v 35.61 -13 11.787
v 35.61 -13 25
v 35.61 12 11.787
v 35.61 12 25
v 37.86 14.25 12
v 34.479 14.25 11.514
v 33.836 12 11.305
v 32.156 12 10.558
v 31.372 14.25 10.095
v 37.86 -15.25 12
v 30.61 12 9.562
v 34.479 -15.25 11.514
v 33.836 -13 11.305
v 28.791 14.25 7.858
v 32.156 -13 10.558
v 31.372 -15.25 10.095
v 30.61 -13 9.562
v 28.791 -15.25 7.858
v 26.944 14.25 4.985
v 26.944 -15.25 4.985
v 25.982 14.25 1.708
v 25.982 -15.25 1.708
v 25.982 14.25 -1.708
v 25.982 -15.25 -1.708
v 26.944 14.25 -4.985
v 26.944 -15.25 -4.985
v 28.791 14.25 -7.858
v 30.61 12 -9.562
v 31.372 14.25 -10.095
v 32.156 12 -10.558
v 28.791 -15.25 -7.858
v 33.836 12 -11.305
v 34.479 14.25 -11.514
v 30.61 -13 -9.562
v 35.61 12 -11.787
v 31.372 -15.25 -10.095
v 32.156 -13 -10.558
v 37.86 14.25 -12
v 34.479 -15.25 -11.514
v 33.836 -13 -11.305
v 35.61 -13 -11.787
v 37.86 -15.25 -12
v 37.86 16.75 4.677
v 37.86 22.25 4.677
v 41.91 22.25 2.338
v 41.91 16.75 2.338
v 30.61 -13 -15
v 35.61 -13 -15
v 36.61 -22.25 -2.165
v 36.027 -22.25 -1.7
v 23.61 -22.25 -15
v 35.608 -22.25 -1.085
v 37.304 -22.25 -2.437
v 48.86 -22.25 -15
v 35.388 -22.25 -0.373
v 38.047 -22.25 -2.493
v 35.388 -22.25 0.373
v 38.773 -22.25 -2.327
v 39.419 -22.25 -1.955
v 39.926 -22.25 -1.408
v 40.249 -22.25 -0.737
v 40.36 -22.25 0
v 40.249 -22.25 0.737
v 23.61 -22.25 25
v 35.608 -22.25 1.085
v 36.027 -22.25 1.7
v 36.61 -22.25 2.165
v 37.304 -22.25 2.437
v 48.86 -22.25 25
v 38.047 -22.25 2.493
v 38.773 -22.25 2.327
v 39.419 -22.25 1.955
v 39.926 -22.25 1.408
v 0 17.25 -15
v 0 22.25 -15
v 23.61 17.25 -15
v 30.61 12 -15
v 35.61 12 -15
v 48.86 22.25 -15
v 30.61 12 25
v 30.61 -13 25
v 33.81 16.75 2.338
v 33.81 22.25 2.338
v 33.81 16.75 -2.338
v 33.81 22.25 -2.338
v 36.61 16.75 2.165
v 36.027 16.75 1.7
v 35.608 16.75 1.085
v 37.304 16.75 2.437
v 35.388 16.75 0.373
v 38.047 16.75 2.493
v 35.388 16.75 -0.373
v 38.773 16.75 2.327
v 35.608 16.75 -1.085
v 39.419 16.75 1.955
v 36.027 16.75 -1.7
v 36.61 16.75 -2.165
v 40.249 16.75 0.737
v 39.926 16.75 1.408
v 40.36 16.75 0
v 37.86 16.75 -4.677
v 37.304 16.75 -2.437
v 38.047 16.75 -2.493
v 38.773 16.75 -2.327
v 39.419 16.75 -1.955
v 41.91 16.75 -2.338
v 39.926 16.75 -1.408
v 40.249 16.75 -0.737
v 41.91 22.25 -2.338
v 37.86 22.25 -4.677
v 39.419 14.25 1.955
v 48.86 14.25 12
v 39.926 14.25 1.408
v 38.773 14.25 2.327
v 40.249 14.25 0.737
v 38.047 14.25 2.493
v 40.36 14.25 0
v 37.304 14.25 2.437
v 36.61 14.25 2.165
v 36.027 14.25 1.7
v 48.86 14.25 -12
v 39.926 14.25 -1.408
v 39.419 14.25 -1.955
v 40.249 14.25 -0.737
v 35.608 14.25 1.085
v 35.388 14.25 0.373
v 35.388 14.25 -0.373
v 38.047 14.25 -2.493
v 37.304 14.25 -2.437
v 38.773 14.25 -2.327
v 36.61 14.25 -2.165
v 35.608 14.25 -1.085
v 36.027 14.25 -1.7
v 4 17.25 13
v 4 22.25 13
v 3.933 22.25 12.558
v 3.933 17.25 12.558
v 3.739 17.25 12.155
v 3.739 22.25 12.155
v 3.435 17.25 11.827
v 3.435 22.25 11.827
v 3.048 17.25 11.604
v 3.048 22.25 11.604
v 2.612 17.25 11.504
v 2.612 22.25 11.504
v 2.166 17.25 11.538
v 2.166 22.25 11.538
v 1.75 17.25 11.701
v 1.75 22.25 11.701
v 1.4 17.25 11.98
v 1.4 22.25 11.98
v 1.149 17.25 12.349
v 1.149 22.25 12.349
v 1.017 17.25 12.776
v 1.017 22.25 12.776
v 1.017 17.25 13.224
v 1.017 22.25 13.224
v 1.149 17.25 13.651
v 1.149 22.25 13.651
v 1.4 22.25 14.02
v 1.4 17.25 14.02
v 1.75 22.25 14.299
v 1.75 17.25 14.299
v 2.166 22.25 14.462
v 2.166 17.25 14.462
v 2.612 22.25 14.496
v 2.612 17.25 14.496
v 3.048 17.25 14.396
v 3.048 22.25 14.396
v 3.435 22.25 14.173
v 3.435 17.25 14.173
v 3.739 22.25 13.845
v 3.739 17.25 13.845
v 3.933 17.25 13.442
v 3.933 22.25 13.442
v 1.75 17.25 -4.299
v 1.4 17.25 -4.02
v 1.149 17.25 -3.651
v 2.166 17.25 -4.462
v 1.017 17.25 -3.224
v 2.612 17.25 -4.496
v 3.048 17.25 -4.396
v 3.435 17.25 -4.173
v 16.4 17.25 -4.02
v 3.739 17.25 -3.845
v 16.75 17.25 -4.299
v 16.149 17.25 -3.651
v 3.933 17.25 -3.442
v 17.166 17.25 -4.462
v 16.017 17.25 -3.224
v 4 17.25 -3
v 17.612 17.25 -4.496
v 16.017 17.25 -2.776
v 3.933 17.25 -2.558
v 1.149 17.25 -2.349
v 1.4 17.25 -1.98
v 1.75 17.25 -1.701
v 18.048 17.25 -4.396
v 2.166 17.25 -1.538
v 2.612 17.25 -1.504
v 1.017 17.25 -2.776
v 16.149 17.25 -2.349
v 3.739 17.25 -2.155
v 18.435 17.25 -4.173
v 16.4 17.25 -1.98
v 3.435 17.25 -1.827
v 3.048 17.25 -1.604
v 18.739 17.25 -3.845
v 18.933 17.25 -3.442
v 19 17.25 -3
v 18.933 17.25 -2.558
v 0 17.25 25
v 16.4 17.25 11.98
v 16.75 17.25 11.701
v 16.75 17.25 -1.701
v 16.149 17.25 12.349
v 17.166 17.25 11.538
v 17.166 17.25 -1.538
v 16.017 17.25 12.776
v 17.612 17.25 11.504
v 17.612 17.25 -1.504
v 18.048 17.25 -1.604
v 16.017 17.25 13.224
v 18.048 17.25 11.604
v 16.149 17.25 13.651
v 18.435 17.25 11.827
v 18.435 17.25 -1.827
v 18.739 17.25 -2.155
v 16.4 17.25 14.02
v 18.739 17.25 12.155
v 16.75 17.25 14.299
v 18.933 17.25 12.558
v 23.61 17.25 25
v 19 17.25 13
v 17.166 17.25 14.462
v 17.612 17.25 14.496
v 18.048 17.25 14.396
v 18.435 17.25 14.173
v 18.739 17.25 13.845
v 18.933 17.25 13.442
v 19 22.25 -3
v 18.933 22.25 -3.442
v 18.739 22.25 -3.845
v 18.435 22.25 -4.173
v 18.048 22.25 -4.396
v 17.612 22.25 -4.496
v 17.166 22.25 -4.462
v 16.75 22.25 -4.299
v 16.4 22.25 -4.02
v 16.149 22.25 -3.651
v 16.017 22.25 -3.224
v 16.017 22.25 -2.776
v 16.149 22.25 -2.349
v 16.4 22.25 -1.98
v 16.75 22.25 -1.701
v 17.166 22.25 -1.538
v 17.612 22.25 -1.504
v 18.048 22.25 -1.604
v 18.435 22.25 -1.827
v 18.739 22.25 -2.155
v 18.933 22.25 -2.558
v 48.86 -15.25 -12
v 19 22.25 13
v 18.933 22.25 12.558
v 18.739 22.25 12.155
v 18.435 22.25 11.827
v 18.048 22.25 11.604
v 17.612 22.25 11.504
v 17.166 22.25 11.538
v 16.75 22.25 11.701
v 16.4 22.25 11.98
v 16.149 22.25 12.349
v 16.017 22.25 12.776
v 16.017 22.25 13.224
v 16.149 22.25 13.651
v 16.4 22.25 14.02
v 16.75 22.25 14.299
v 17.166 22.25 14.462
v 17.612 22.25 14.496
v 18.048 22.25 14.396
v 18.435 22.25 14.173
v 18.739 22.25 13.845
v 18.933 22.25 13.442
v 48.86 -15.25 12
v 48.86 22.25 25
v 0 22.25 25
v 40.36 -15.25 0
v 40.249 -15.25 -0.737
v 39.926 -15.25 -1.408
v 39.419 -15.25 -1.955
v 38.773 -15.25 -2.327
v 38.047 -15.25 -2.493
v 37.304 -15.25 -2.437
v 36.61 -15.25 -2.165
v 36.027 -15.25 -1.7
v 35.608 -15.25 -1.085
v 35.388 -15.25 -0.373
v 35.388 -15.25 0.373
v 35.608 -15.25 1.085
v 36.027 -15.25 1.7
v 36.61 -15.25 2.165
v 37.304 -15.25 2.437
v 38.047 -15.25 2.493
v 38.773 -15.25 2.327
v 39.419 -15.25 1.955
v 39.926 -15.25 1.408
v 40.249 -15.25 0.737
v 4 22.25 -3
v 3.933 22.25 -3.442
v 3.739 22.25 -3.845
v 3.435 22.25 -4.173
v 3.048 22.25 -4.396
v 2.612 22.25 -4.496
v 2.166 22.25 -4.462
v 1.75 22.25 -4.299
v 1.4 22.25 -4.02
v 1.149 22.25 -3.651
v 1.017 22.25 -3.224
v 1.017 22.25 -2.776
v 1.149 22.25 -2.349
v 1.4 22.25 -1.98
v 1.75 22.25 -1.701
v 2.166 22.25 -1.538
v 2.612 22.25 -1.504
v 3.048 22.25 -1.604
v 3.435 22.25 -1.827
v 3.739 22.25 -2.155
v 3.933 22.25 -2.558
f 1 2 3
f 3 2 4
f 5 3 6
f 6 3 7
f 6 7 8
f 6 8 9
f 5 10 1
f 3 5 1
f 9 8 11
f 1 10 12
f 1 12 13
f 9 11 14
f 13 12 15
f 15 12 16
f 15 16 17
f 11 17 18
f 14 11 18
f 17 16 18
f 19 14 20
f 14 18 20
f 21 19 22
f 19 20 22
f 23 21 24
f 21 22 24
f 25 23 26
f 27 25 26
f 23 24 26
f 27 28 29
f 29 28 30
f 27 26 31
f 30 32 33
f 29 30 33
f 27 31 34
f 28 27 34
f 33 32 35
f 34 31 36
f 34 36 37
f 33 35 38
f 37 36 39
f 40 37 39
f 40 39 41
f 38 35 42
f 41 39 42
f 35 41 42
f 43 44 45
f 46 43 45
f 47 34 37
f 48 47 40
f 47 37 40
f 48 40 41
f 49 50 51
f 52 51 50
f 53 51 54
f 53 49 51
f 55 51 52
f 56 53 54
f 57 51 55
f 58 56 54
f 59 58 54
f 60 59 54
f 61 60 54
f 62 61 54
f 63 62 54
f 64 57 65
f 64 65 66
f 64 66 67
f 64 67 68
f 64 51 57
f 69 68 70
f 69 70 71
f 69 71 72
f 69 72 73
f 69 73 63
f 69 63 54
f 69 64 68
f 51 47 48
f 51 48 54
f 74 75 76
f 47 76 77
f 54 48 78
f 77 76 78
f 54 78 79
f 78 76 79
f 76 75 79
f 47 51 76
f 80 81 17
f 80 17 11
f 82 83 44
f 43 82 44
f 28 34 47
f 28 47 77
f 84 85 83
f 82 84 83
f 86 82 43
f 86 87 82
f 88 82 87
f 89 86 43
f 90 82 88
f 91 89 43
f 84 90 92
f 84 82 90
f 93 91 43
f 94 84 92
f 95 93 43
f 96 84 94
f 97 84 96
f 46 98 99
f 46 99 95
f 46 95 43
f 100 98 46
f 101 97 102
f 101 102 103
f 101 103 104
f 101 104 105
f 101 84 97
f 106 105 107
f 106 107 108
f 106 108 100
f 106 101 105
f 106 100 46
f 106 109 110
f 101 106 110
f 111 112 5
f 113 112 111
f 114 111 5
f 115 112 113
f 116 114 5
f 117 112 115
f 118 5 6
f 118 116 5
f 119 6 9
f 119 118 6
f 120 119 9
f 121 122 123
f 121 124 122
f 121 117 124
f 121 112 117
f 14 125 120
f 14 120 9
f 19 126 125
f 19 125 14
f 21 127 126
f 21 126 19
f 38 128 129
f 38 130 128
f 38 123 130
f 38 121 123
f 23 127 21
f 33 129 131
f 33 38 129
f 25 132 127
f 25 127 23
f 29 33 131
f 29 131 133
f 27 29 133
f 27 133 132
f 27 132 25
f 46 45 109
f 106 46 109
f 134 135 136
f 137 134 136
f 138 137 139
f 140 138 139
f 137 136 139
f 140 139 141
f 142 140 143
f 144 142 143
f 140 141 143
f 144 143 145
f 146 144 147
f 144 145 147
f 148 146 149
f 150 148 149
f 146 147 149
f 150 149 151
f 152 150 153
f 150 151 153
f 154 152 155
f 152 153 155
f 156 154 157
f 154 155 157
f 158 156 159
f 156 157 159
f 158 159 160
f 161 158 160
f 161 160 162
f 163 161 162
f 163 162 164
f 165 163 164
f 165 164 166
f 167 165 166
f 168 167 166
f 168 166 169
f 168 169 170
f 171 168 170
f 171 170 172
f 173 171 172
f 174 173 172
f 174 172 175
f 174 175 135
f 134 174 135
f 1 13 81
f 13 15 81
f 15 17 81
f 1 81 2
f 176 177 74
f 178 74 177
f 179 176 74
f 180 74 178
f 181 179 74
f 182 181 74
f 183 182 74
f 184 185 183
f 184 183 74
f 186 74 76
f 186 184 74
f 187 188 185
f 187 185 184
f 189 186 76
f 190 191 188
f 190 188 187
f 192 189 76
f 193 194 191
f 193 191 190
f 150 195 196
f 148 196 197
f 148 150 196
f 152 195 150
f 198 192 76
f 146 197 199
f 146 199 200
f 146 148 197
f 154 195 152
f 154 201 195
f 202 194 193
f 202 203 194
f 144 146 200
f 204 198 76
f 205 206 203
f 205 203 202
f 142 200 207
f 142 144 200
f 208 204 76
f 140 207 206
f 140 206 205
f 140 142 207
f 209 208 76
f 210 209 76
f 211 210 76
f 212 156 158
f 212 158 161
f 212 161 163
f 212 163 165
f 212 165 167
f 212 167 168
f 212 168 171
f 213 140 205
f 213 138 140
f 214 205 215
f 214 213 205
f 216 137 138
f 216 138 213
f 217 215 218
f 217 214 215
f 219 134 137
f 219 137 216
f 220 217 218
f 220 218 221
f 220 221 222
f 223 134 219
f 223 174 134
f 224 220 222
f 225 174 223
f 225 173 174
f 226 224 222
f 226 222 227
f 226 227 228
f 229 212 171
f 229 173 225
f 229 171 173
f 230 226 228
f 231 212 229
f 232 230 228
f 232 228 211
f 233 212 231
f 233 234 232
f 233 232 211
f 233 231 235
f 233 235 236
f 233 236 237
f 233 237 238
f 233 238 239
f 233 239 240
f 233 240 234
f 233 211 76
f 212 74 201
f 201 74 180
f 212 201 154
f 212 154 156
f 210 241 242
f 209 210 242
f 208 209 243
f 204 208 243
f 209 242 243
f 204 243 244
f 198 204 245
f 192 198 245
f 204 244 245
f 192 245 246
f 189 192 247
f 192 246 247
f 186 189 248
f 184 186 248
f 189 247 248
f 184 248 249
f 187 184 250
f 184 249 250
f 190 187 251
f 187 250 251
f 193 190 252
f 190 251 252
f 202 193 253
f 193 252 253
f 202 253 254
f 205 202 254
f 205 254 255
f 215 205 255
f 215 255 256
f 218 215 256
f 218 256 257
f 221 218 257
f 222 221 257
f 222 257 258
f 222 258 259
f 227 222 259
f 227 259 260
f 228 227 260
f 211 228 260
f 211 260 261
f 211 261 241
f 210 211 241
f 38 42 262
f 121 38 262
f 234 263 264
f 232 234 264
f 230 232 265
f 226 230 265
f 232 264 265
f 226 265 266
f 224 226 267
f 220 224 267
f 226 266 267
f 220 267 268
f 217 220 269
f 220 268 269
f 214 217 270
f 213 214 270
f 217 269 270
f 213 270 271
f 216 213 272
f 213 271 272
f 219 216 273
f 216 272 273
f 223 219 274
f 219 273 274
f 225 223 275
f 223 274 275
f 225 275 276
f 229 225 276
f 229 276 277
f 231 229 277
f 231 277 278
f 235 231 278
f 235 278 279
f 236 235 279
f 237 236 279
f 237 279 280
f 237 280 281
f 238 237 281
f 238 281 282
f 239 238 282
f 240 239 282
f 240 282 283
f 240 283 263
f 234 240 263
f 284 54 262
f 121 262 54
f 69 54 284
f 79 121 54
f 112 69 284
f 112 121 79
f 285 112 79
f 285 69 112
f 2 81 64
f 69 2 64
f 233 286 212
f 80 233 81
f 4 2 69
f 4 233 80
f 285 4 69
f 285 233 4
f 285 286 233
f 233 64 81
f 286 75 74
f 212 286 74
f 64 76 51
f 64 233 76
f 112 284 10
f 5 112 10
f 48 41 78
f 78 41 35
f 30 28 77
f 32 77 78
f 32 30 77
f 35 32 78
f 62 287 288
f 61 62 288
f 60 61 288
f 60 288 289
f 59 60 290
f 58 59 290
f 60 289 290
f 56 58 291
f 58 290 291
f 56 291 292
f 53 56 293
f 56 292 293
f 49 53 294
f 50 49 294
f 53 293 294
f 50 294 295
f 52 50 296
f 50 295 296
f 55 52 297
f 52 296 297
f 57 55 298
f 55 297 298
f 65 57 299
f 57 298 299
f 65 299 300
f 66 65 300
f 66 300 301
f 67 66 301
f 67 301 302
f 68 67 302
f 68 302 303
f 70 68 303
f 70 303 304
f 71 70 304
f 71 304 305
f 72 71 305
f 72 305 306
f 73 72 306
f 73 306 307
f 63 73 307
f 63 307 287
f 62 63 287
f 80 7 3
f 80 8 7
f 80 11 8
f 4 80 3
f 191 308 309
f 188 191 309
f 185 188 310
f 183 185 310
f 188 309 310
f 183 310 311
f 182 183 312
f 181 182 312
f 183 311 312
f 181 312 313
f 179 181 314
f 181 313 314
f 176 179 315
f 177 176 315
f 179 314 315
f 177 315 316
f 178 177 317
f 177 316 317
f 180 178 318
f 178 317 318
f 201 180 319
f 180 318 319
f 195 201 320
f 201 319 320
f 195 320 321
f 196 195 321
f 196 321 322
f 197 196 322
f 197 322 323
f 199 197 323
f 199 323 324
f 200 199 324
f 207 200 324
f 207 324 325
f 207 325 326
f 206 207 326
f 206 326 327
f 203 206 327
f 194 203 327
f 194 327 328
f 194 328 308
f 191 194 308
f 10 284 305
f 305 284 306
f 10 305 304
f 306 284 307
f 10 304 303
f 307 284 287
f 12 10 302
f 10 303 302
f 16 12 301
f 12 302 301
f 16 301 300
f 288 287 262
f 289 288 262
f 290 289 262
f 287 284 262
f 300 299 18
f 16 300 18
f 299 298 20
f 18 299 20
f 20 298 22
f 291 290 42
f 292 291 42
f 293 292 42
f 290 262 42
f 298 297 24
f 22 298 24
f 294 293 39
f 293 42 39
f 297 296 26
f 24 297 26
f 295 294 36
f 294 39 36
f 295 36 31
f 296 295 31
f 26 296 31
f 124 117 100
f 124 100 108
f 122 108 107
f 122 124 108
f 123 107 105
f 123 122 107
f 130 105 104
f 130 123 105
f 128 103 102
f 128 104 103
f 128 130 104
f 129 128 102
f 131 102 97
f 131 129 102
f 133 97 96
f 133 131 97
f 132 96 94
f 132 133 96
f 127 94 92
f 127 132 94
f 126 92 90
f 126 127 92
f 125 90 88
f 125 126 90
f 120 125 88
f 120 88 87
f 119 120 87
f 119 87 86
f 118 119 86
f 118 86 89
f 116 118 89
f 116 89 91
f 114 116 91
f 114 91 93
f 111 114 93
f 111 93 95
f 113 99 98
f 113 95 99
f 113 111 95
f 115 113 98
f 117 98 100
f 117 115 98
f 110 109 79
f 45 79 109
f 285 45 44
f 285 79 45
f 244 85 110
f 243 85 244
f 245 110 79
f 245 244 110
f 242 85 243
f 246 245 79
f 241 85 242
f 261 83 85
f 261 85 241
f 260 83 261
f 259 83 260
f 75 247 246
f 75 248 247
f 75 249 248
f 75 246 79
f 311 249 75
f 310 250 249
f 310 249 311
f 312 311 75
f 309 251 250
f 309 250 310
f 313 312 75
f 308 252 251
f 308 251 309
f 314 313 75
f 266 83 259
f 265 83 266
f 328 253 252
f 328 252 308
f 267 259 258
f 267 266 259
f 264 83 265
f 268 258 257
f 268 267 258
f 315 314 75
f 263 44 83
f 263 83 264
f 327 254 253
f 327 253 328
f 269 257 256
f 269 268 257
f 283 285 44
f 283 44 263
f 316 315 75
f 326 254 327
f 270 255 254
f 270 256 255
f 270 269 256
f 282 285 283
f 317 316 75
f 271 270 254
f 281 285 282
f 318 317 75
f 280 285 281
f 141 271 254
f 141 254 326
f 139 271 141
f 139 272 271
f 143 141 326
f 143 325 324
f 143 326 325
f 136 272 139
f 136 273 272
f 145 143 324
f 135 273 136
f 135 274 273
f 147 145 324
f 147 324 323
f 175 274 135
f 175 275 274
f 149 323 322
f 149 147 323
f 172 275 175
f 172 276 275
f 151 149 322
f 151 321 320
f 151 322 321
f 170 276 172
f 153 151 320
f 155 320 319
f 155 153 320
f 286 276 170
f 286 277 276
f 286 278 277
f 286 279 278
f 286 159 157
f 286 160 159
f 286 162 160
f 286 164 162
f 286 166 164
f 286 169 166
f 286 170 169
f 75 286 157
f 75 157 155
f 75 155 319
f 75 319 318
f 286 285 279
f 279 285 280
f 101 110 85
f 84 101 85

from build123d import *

# Parameters (mm, degrees)
SKETCH1_W                = 5
SKETCH1_H                = 25
BOSS_EXTRUDE1_DEPTH      = 25
BOSS_EXTRUDE1_DEPTH_BACK = 15
CUT_EXTRUDE1_START       = -15.25
CUT_EXTRUDE1_DEPTH       = 29.5
SKETCH5_R                = 2.5
CUT_EXTRUDE4_DEPTH       = 38.5
CUT_EXTRUDE4_DEPTH_BACK  = 8
CUT_EXTRUDE5_DEPTH       = 5.5
SKETCH7_R                = 1.5
CUT_EXTRUDE6_DEPTH       = 45.5


with BuildPart() as part:
    # Sketch1 → Boss-Extrude1 (new body, two sides)
    with BuildSketch(Plane.XY) as boss_extrude1_sk:
        Polygon((23.61, -22.25), (48.86, -22.25), (48.86, 22.25), (0, 22.25), (0, 17.25), (23.61, 17.25), align=None)
        with Locations((33.11, -0.5)):
            Rectangle(SKETCH1_W, SKETCH1_H, mode=Mode.SUBTRACT)
    extrude(amount=BOSS_EXTRUDE1_DEPTH)
    extrude(boss_extrude1_sk.sketch, amount=-BOSS_EXTRUDE1_DEPTH_BACK)

    # Sketch2 → Cut-Extrude1 (cut)
    with BuildSketch(Plane(origin=(0, 0, 0), x_dir=(1, 0, 0), z_dir=(0, 1, 0)).offset(CUT_EXTRUDE1_START)):
        with BuildLine():
            Line((37.86, 12), (48.86, 12))
            Line((48.86, 12), (48.86, -12))
            Line((48.86, -12), (37.86, -12))
            ThreePointArc((37.86, -12), (25.86, 0), (37.86, 12))
        make_face()
    extrude(amount=CUT_EXTRUDE1_DEPTH, mode=Mode.SUBTRACT)

    # Sketch5 → Cut-Extrude4 (cut, two sides)
    with BuildSketch(Plane(origin=(0, -15.25, 0), x_dir=(1, 0, 0), z_dir=(0, 1, 0))) as cut_extrude4_sk:
        with Locations((37.86, 0)):
            Circle(SKETCH5_R)
    extrude(amount=CUT_EXTRUDE4_DEPTH, mode=Mode.SUBTRACT)
    extrude(cut_extrude4_sk.sketch, amount=-CUT_EXTRUDE4_DEPTH_BACK, mode=Mode.SUBTRACT)

    # Sketch6 → Cut-Extrude5 (cut)
    with BuildSketch(Plane(origin=(0, 22.25, 0), x_dir=(1, 0, 0), z_dir=(0, 1, 0))):
        Polygon((41.91, 2.33826859), (37.86, 4.67653718), (33.81, 2.33826859), (33.81, -2.33826859), (37.86, -4.67653718), (41.91, -2.33826859), align=None)
    extrude(amount=-CUT_EXTRUDE5_DEPTH, mode=Mode.SUBTRACT)

    # Sketch7 → Cut-Extrude6 (cut, through all)
    with BuildSketch(Plane(origin=(0, 22.25, 0), x_dir=(1, 0, 0), z_dir=(0, 1, 0))):
        with Locations((2.5, 3)):
            Circle(SKETCH7_R)
        with Locations((17.5, 3)):
            Circle(SKETCH7_R)
        with Locations((17.5, -13)):
            Circle(SKETCH7_R)
        with Locations((2.5, -13)):
            Circle(SKETCH7_R)
    extrude(amount=-CUT_EXTRUDE6_DEPTH, mode=Mode.SUBTRACT)


solid = part.part
